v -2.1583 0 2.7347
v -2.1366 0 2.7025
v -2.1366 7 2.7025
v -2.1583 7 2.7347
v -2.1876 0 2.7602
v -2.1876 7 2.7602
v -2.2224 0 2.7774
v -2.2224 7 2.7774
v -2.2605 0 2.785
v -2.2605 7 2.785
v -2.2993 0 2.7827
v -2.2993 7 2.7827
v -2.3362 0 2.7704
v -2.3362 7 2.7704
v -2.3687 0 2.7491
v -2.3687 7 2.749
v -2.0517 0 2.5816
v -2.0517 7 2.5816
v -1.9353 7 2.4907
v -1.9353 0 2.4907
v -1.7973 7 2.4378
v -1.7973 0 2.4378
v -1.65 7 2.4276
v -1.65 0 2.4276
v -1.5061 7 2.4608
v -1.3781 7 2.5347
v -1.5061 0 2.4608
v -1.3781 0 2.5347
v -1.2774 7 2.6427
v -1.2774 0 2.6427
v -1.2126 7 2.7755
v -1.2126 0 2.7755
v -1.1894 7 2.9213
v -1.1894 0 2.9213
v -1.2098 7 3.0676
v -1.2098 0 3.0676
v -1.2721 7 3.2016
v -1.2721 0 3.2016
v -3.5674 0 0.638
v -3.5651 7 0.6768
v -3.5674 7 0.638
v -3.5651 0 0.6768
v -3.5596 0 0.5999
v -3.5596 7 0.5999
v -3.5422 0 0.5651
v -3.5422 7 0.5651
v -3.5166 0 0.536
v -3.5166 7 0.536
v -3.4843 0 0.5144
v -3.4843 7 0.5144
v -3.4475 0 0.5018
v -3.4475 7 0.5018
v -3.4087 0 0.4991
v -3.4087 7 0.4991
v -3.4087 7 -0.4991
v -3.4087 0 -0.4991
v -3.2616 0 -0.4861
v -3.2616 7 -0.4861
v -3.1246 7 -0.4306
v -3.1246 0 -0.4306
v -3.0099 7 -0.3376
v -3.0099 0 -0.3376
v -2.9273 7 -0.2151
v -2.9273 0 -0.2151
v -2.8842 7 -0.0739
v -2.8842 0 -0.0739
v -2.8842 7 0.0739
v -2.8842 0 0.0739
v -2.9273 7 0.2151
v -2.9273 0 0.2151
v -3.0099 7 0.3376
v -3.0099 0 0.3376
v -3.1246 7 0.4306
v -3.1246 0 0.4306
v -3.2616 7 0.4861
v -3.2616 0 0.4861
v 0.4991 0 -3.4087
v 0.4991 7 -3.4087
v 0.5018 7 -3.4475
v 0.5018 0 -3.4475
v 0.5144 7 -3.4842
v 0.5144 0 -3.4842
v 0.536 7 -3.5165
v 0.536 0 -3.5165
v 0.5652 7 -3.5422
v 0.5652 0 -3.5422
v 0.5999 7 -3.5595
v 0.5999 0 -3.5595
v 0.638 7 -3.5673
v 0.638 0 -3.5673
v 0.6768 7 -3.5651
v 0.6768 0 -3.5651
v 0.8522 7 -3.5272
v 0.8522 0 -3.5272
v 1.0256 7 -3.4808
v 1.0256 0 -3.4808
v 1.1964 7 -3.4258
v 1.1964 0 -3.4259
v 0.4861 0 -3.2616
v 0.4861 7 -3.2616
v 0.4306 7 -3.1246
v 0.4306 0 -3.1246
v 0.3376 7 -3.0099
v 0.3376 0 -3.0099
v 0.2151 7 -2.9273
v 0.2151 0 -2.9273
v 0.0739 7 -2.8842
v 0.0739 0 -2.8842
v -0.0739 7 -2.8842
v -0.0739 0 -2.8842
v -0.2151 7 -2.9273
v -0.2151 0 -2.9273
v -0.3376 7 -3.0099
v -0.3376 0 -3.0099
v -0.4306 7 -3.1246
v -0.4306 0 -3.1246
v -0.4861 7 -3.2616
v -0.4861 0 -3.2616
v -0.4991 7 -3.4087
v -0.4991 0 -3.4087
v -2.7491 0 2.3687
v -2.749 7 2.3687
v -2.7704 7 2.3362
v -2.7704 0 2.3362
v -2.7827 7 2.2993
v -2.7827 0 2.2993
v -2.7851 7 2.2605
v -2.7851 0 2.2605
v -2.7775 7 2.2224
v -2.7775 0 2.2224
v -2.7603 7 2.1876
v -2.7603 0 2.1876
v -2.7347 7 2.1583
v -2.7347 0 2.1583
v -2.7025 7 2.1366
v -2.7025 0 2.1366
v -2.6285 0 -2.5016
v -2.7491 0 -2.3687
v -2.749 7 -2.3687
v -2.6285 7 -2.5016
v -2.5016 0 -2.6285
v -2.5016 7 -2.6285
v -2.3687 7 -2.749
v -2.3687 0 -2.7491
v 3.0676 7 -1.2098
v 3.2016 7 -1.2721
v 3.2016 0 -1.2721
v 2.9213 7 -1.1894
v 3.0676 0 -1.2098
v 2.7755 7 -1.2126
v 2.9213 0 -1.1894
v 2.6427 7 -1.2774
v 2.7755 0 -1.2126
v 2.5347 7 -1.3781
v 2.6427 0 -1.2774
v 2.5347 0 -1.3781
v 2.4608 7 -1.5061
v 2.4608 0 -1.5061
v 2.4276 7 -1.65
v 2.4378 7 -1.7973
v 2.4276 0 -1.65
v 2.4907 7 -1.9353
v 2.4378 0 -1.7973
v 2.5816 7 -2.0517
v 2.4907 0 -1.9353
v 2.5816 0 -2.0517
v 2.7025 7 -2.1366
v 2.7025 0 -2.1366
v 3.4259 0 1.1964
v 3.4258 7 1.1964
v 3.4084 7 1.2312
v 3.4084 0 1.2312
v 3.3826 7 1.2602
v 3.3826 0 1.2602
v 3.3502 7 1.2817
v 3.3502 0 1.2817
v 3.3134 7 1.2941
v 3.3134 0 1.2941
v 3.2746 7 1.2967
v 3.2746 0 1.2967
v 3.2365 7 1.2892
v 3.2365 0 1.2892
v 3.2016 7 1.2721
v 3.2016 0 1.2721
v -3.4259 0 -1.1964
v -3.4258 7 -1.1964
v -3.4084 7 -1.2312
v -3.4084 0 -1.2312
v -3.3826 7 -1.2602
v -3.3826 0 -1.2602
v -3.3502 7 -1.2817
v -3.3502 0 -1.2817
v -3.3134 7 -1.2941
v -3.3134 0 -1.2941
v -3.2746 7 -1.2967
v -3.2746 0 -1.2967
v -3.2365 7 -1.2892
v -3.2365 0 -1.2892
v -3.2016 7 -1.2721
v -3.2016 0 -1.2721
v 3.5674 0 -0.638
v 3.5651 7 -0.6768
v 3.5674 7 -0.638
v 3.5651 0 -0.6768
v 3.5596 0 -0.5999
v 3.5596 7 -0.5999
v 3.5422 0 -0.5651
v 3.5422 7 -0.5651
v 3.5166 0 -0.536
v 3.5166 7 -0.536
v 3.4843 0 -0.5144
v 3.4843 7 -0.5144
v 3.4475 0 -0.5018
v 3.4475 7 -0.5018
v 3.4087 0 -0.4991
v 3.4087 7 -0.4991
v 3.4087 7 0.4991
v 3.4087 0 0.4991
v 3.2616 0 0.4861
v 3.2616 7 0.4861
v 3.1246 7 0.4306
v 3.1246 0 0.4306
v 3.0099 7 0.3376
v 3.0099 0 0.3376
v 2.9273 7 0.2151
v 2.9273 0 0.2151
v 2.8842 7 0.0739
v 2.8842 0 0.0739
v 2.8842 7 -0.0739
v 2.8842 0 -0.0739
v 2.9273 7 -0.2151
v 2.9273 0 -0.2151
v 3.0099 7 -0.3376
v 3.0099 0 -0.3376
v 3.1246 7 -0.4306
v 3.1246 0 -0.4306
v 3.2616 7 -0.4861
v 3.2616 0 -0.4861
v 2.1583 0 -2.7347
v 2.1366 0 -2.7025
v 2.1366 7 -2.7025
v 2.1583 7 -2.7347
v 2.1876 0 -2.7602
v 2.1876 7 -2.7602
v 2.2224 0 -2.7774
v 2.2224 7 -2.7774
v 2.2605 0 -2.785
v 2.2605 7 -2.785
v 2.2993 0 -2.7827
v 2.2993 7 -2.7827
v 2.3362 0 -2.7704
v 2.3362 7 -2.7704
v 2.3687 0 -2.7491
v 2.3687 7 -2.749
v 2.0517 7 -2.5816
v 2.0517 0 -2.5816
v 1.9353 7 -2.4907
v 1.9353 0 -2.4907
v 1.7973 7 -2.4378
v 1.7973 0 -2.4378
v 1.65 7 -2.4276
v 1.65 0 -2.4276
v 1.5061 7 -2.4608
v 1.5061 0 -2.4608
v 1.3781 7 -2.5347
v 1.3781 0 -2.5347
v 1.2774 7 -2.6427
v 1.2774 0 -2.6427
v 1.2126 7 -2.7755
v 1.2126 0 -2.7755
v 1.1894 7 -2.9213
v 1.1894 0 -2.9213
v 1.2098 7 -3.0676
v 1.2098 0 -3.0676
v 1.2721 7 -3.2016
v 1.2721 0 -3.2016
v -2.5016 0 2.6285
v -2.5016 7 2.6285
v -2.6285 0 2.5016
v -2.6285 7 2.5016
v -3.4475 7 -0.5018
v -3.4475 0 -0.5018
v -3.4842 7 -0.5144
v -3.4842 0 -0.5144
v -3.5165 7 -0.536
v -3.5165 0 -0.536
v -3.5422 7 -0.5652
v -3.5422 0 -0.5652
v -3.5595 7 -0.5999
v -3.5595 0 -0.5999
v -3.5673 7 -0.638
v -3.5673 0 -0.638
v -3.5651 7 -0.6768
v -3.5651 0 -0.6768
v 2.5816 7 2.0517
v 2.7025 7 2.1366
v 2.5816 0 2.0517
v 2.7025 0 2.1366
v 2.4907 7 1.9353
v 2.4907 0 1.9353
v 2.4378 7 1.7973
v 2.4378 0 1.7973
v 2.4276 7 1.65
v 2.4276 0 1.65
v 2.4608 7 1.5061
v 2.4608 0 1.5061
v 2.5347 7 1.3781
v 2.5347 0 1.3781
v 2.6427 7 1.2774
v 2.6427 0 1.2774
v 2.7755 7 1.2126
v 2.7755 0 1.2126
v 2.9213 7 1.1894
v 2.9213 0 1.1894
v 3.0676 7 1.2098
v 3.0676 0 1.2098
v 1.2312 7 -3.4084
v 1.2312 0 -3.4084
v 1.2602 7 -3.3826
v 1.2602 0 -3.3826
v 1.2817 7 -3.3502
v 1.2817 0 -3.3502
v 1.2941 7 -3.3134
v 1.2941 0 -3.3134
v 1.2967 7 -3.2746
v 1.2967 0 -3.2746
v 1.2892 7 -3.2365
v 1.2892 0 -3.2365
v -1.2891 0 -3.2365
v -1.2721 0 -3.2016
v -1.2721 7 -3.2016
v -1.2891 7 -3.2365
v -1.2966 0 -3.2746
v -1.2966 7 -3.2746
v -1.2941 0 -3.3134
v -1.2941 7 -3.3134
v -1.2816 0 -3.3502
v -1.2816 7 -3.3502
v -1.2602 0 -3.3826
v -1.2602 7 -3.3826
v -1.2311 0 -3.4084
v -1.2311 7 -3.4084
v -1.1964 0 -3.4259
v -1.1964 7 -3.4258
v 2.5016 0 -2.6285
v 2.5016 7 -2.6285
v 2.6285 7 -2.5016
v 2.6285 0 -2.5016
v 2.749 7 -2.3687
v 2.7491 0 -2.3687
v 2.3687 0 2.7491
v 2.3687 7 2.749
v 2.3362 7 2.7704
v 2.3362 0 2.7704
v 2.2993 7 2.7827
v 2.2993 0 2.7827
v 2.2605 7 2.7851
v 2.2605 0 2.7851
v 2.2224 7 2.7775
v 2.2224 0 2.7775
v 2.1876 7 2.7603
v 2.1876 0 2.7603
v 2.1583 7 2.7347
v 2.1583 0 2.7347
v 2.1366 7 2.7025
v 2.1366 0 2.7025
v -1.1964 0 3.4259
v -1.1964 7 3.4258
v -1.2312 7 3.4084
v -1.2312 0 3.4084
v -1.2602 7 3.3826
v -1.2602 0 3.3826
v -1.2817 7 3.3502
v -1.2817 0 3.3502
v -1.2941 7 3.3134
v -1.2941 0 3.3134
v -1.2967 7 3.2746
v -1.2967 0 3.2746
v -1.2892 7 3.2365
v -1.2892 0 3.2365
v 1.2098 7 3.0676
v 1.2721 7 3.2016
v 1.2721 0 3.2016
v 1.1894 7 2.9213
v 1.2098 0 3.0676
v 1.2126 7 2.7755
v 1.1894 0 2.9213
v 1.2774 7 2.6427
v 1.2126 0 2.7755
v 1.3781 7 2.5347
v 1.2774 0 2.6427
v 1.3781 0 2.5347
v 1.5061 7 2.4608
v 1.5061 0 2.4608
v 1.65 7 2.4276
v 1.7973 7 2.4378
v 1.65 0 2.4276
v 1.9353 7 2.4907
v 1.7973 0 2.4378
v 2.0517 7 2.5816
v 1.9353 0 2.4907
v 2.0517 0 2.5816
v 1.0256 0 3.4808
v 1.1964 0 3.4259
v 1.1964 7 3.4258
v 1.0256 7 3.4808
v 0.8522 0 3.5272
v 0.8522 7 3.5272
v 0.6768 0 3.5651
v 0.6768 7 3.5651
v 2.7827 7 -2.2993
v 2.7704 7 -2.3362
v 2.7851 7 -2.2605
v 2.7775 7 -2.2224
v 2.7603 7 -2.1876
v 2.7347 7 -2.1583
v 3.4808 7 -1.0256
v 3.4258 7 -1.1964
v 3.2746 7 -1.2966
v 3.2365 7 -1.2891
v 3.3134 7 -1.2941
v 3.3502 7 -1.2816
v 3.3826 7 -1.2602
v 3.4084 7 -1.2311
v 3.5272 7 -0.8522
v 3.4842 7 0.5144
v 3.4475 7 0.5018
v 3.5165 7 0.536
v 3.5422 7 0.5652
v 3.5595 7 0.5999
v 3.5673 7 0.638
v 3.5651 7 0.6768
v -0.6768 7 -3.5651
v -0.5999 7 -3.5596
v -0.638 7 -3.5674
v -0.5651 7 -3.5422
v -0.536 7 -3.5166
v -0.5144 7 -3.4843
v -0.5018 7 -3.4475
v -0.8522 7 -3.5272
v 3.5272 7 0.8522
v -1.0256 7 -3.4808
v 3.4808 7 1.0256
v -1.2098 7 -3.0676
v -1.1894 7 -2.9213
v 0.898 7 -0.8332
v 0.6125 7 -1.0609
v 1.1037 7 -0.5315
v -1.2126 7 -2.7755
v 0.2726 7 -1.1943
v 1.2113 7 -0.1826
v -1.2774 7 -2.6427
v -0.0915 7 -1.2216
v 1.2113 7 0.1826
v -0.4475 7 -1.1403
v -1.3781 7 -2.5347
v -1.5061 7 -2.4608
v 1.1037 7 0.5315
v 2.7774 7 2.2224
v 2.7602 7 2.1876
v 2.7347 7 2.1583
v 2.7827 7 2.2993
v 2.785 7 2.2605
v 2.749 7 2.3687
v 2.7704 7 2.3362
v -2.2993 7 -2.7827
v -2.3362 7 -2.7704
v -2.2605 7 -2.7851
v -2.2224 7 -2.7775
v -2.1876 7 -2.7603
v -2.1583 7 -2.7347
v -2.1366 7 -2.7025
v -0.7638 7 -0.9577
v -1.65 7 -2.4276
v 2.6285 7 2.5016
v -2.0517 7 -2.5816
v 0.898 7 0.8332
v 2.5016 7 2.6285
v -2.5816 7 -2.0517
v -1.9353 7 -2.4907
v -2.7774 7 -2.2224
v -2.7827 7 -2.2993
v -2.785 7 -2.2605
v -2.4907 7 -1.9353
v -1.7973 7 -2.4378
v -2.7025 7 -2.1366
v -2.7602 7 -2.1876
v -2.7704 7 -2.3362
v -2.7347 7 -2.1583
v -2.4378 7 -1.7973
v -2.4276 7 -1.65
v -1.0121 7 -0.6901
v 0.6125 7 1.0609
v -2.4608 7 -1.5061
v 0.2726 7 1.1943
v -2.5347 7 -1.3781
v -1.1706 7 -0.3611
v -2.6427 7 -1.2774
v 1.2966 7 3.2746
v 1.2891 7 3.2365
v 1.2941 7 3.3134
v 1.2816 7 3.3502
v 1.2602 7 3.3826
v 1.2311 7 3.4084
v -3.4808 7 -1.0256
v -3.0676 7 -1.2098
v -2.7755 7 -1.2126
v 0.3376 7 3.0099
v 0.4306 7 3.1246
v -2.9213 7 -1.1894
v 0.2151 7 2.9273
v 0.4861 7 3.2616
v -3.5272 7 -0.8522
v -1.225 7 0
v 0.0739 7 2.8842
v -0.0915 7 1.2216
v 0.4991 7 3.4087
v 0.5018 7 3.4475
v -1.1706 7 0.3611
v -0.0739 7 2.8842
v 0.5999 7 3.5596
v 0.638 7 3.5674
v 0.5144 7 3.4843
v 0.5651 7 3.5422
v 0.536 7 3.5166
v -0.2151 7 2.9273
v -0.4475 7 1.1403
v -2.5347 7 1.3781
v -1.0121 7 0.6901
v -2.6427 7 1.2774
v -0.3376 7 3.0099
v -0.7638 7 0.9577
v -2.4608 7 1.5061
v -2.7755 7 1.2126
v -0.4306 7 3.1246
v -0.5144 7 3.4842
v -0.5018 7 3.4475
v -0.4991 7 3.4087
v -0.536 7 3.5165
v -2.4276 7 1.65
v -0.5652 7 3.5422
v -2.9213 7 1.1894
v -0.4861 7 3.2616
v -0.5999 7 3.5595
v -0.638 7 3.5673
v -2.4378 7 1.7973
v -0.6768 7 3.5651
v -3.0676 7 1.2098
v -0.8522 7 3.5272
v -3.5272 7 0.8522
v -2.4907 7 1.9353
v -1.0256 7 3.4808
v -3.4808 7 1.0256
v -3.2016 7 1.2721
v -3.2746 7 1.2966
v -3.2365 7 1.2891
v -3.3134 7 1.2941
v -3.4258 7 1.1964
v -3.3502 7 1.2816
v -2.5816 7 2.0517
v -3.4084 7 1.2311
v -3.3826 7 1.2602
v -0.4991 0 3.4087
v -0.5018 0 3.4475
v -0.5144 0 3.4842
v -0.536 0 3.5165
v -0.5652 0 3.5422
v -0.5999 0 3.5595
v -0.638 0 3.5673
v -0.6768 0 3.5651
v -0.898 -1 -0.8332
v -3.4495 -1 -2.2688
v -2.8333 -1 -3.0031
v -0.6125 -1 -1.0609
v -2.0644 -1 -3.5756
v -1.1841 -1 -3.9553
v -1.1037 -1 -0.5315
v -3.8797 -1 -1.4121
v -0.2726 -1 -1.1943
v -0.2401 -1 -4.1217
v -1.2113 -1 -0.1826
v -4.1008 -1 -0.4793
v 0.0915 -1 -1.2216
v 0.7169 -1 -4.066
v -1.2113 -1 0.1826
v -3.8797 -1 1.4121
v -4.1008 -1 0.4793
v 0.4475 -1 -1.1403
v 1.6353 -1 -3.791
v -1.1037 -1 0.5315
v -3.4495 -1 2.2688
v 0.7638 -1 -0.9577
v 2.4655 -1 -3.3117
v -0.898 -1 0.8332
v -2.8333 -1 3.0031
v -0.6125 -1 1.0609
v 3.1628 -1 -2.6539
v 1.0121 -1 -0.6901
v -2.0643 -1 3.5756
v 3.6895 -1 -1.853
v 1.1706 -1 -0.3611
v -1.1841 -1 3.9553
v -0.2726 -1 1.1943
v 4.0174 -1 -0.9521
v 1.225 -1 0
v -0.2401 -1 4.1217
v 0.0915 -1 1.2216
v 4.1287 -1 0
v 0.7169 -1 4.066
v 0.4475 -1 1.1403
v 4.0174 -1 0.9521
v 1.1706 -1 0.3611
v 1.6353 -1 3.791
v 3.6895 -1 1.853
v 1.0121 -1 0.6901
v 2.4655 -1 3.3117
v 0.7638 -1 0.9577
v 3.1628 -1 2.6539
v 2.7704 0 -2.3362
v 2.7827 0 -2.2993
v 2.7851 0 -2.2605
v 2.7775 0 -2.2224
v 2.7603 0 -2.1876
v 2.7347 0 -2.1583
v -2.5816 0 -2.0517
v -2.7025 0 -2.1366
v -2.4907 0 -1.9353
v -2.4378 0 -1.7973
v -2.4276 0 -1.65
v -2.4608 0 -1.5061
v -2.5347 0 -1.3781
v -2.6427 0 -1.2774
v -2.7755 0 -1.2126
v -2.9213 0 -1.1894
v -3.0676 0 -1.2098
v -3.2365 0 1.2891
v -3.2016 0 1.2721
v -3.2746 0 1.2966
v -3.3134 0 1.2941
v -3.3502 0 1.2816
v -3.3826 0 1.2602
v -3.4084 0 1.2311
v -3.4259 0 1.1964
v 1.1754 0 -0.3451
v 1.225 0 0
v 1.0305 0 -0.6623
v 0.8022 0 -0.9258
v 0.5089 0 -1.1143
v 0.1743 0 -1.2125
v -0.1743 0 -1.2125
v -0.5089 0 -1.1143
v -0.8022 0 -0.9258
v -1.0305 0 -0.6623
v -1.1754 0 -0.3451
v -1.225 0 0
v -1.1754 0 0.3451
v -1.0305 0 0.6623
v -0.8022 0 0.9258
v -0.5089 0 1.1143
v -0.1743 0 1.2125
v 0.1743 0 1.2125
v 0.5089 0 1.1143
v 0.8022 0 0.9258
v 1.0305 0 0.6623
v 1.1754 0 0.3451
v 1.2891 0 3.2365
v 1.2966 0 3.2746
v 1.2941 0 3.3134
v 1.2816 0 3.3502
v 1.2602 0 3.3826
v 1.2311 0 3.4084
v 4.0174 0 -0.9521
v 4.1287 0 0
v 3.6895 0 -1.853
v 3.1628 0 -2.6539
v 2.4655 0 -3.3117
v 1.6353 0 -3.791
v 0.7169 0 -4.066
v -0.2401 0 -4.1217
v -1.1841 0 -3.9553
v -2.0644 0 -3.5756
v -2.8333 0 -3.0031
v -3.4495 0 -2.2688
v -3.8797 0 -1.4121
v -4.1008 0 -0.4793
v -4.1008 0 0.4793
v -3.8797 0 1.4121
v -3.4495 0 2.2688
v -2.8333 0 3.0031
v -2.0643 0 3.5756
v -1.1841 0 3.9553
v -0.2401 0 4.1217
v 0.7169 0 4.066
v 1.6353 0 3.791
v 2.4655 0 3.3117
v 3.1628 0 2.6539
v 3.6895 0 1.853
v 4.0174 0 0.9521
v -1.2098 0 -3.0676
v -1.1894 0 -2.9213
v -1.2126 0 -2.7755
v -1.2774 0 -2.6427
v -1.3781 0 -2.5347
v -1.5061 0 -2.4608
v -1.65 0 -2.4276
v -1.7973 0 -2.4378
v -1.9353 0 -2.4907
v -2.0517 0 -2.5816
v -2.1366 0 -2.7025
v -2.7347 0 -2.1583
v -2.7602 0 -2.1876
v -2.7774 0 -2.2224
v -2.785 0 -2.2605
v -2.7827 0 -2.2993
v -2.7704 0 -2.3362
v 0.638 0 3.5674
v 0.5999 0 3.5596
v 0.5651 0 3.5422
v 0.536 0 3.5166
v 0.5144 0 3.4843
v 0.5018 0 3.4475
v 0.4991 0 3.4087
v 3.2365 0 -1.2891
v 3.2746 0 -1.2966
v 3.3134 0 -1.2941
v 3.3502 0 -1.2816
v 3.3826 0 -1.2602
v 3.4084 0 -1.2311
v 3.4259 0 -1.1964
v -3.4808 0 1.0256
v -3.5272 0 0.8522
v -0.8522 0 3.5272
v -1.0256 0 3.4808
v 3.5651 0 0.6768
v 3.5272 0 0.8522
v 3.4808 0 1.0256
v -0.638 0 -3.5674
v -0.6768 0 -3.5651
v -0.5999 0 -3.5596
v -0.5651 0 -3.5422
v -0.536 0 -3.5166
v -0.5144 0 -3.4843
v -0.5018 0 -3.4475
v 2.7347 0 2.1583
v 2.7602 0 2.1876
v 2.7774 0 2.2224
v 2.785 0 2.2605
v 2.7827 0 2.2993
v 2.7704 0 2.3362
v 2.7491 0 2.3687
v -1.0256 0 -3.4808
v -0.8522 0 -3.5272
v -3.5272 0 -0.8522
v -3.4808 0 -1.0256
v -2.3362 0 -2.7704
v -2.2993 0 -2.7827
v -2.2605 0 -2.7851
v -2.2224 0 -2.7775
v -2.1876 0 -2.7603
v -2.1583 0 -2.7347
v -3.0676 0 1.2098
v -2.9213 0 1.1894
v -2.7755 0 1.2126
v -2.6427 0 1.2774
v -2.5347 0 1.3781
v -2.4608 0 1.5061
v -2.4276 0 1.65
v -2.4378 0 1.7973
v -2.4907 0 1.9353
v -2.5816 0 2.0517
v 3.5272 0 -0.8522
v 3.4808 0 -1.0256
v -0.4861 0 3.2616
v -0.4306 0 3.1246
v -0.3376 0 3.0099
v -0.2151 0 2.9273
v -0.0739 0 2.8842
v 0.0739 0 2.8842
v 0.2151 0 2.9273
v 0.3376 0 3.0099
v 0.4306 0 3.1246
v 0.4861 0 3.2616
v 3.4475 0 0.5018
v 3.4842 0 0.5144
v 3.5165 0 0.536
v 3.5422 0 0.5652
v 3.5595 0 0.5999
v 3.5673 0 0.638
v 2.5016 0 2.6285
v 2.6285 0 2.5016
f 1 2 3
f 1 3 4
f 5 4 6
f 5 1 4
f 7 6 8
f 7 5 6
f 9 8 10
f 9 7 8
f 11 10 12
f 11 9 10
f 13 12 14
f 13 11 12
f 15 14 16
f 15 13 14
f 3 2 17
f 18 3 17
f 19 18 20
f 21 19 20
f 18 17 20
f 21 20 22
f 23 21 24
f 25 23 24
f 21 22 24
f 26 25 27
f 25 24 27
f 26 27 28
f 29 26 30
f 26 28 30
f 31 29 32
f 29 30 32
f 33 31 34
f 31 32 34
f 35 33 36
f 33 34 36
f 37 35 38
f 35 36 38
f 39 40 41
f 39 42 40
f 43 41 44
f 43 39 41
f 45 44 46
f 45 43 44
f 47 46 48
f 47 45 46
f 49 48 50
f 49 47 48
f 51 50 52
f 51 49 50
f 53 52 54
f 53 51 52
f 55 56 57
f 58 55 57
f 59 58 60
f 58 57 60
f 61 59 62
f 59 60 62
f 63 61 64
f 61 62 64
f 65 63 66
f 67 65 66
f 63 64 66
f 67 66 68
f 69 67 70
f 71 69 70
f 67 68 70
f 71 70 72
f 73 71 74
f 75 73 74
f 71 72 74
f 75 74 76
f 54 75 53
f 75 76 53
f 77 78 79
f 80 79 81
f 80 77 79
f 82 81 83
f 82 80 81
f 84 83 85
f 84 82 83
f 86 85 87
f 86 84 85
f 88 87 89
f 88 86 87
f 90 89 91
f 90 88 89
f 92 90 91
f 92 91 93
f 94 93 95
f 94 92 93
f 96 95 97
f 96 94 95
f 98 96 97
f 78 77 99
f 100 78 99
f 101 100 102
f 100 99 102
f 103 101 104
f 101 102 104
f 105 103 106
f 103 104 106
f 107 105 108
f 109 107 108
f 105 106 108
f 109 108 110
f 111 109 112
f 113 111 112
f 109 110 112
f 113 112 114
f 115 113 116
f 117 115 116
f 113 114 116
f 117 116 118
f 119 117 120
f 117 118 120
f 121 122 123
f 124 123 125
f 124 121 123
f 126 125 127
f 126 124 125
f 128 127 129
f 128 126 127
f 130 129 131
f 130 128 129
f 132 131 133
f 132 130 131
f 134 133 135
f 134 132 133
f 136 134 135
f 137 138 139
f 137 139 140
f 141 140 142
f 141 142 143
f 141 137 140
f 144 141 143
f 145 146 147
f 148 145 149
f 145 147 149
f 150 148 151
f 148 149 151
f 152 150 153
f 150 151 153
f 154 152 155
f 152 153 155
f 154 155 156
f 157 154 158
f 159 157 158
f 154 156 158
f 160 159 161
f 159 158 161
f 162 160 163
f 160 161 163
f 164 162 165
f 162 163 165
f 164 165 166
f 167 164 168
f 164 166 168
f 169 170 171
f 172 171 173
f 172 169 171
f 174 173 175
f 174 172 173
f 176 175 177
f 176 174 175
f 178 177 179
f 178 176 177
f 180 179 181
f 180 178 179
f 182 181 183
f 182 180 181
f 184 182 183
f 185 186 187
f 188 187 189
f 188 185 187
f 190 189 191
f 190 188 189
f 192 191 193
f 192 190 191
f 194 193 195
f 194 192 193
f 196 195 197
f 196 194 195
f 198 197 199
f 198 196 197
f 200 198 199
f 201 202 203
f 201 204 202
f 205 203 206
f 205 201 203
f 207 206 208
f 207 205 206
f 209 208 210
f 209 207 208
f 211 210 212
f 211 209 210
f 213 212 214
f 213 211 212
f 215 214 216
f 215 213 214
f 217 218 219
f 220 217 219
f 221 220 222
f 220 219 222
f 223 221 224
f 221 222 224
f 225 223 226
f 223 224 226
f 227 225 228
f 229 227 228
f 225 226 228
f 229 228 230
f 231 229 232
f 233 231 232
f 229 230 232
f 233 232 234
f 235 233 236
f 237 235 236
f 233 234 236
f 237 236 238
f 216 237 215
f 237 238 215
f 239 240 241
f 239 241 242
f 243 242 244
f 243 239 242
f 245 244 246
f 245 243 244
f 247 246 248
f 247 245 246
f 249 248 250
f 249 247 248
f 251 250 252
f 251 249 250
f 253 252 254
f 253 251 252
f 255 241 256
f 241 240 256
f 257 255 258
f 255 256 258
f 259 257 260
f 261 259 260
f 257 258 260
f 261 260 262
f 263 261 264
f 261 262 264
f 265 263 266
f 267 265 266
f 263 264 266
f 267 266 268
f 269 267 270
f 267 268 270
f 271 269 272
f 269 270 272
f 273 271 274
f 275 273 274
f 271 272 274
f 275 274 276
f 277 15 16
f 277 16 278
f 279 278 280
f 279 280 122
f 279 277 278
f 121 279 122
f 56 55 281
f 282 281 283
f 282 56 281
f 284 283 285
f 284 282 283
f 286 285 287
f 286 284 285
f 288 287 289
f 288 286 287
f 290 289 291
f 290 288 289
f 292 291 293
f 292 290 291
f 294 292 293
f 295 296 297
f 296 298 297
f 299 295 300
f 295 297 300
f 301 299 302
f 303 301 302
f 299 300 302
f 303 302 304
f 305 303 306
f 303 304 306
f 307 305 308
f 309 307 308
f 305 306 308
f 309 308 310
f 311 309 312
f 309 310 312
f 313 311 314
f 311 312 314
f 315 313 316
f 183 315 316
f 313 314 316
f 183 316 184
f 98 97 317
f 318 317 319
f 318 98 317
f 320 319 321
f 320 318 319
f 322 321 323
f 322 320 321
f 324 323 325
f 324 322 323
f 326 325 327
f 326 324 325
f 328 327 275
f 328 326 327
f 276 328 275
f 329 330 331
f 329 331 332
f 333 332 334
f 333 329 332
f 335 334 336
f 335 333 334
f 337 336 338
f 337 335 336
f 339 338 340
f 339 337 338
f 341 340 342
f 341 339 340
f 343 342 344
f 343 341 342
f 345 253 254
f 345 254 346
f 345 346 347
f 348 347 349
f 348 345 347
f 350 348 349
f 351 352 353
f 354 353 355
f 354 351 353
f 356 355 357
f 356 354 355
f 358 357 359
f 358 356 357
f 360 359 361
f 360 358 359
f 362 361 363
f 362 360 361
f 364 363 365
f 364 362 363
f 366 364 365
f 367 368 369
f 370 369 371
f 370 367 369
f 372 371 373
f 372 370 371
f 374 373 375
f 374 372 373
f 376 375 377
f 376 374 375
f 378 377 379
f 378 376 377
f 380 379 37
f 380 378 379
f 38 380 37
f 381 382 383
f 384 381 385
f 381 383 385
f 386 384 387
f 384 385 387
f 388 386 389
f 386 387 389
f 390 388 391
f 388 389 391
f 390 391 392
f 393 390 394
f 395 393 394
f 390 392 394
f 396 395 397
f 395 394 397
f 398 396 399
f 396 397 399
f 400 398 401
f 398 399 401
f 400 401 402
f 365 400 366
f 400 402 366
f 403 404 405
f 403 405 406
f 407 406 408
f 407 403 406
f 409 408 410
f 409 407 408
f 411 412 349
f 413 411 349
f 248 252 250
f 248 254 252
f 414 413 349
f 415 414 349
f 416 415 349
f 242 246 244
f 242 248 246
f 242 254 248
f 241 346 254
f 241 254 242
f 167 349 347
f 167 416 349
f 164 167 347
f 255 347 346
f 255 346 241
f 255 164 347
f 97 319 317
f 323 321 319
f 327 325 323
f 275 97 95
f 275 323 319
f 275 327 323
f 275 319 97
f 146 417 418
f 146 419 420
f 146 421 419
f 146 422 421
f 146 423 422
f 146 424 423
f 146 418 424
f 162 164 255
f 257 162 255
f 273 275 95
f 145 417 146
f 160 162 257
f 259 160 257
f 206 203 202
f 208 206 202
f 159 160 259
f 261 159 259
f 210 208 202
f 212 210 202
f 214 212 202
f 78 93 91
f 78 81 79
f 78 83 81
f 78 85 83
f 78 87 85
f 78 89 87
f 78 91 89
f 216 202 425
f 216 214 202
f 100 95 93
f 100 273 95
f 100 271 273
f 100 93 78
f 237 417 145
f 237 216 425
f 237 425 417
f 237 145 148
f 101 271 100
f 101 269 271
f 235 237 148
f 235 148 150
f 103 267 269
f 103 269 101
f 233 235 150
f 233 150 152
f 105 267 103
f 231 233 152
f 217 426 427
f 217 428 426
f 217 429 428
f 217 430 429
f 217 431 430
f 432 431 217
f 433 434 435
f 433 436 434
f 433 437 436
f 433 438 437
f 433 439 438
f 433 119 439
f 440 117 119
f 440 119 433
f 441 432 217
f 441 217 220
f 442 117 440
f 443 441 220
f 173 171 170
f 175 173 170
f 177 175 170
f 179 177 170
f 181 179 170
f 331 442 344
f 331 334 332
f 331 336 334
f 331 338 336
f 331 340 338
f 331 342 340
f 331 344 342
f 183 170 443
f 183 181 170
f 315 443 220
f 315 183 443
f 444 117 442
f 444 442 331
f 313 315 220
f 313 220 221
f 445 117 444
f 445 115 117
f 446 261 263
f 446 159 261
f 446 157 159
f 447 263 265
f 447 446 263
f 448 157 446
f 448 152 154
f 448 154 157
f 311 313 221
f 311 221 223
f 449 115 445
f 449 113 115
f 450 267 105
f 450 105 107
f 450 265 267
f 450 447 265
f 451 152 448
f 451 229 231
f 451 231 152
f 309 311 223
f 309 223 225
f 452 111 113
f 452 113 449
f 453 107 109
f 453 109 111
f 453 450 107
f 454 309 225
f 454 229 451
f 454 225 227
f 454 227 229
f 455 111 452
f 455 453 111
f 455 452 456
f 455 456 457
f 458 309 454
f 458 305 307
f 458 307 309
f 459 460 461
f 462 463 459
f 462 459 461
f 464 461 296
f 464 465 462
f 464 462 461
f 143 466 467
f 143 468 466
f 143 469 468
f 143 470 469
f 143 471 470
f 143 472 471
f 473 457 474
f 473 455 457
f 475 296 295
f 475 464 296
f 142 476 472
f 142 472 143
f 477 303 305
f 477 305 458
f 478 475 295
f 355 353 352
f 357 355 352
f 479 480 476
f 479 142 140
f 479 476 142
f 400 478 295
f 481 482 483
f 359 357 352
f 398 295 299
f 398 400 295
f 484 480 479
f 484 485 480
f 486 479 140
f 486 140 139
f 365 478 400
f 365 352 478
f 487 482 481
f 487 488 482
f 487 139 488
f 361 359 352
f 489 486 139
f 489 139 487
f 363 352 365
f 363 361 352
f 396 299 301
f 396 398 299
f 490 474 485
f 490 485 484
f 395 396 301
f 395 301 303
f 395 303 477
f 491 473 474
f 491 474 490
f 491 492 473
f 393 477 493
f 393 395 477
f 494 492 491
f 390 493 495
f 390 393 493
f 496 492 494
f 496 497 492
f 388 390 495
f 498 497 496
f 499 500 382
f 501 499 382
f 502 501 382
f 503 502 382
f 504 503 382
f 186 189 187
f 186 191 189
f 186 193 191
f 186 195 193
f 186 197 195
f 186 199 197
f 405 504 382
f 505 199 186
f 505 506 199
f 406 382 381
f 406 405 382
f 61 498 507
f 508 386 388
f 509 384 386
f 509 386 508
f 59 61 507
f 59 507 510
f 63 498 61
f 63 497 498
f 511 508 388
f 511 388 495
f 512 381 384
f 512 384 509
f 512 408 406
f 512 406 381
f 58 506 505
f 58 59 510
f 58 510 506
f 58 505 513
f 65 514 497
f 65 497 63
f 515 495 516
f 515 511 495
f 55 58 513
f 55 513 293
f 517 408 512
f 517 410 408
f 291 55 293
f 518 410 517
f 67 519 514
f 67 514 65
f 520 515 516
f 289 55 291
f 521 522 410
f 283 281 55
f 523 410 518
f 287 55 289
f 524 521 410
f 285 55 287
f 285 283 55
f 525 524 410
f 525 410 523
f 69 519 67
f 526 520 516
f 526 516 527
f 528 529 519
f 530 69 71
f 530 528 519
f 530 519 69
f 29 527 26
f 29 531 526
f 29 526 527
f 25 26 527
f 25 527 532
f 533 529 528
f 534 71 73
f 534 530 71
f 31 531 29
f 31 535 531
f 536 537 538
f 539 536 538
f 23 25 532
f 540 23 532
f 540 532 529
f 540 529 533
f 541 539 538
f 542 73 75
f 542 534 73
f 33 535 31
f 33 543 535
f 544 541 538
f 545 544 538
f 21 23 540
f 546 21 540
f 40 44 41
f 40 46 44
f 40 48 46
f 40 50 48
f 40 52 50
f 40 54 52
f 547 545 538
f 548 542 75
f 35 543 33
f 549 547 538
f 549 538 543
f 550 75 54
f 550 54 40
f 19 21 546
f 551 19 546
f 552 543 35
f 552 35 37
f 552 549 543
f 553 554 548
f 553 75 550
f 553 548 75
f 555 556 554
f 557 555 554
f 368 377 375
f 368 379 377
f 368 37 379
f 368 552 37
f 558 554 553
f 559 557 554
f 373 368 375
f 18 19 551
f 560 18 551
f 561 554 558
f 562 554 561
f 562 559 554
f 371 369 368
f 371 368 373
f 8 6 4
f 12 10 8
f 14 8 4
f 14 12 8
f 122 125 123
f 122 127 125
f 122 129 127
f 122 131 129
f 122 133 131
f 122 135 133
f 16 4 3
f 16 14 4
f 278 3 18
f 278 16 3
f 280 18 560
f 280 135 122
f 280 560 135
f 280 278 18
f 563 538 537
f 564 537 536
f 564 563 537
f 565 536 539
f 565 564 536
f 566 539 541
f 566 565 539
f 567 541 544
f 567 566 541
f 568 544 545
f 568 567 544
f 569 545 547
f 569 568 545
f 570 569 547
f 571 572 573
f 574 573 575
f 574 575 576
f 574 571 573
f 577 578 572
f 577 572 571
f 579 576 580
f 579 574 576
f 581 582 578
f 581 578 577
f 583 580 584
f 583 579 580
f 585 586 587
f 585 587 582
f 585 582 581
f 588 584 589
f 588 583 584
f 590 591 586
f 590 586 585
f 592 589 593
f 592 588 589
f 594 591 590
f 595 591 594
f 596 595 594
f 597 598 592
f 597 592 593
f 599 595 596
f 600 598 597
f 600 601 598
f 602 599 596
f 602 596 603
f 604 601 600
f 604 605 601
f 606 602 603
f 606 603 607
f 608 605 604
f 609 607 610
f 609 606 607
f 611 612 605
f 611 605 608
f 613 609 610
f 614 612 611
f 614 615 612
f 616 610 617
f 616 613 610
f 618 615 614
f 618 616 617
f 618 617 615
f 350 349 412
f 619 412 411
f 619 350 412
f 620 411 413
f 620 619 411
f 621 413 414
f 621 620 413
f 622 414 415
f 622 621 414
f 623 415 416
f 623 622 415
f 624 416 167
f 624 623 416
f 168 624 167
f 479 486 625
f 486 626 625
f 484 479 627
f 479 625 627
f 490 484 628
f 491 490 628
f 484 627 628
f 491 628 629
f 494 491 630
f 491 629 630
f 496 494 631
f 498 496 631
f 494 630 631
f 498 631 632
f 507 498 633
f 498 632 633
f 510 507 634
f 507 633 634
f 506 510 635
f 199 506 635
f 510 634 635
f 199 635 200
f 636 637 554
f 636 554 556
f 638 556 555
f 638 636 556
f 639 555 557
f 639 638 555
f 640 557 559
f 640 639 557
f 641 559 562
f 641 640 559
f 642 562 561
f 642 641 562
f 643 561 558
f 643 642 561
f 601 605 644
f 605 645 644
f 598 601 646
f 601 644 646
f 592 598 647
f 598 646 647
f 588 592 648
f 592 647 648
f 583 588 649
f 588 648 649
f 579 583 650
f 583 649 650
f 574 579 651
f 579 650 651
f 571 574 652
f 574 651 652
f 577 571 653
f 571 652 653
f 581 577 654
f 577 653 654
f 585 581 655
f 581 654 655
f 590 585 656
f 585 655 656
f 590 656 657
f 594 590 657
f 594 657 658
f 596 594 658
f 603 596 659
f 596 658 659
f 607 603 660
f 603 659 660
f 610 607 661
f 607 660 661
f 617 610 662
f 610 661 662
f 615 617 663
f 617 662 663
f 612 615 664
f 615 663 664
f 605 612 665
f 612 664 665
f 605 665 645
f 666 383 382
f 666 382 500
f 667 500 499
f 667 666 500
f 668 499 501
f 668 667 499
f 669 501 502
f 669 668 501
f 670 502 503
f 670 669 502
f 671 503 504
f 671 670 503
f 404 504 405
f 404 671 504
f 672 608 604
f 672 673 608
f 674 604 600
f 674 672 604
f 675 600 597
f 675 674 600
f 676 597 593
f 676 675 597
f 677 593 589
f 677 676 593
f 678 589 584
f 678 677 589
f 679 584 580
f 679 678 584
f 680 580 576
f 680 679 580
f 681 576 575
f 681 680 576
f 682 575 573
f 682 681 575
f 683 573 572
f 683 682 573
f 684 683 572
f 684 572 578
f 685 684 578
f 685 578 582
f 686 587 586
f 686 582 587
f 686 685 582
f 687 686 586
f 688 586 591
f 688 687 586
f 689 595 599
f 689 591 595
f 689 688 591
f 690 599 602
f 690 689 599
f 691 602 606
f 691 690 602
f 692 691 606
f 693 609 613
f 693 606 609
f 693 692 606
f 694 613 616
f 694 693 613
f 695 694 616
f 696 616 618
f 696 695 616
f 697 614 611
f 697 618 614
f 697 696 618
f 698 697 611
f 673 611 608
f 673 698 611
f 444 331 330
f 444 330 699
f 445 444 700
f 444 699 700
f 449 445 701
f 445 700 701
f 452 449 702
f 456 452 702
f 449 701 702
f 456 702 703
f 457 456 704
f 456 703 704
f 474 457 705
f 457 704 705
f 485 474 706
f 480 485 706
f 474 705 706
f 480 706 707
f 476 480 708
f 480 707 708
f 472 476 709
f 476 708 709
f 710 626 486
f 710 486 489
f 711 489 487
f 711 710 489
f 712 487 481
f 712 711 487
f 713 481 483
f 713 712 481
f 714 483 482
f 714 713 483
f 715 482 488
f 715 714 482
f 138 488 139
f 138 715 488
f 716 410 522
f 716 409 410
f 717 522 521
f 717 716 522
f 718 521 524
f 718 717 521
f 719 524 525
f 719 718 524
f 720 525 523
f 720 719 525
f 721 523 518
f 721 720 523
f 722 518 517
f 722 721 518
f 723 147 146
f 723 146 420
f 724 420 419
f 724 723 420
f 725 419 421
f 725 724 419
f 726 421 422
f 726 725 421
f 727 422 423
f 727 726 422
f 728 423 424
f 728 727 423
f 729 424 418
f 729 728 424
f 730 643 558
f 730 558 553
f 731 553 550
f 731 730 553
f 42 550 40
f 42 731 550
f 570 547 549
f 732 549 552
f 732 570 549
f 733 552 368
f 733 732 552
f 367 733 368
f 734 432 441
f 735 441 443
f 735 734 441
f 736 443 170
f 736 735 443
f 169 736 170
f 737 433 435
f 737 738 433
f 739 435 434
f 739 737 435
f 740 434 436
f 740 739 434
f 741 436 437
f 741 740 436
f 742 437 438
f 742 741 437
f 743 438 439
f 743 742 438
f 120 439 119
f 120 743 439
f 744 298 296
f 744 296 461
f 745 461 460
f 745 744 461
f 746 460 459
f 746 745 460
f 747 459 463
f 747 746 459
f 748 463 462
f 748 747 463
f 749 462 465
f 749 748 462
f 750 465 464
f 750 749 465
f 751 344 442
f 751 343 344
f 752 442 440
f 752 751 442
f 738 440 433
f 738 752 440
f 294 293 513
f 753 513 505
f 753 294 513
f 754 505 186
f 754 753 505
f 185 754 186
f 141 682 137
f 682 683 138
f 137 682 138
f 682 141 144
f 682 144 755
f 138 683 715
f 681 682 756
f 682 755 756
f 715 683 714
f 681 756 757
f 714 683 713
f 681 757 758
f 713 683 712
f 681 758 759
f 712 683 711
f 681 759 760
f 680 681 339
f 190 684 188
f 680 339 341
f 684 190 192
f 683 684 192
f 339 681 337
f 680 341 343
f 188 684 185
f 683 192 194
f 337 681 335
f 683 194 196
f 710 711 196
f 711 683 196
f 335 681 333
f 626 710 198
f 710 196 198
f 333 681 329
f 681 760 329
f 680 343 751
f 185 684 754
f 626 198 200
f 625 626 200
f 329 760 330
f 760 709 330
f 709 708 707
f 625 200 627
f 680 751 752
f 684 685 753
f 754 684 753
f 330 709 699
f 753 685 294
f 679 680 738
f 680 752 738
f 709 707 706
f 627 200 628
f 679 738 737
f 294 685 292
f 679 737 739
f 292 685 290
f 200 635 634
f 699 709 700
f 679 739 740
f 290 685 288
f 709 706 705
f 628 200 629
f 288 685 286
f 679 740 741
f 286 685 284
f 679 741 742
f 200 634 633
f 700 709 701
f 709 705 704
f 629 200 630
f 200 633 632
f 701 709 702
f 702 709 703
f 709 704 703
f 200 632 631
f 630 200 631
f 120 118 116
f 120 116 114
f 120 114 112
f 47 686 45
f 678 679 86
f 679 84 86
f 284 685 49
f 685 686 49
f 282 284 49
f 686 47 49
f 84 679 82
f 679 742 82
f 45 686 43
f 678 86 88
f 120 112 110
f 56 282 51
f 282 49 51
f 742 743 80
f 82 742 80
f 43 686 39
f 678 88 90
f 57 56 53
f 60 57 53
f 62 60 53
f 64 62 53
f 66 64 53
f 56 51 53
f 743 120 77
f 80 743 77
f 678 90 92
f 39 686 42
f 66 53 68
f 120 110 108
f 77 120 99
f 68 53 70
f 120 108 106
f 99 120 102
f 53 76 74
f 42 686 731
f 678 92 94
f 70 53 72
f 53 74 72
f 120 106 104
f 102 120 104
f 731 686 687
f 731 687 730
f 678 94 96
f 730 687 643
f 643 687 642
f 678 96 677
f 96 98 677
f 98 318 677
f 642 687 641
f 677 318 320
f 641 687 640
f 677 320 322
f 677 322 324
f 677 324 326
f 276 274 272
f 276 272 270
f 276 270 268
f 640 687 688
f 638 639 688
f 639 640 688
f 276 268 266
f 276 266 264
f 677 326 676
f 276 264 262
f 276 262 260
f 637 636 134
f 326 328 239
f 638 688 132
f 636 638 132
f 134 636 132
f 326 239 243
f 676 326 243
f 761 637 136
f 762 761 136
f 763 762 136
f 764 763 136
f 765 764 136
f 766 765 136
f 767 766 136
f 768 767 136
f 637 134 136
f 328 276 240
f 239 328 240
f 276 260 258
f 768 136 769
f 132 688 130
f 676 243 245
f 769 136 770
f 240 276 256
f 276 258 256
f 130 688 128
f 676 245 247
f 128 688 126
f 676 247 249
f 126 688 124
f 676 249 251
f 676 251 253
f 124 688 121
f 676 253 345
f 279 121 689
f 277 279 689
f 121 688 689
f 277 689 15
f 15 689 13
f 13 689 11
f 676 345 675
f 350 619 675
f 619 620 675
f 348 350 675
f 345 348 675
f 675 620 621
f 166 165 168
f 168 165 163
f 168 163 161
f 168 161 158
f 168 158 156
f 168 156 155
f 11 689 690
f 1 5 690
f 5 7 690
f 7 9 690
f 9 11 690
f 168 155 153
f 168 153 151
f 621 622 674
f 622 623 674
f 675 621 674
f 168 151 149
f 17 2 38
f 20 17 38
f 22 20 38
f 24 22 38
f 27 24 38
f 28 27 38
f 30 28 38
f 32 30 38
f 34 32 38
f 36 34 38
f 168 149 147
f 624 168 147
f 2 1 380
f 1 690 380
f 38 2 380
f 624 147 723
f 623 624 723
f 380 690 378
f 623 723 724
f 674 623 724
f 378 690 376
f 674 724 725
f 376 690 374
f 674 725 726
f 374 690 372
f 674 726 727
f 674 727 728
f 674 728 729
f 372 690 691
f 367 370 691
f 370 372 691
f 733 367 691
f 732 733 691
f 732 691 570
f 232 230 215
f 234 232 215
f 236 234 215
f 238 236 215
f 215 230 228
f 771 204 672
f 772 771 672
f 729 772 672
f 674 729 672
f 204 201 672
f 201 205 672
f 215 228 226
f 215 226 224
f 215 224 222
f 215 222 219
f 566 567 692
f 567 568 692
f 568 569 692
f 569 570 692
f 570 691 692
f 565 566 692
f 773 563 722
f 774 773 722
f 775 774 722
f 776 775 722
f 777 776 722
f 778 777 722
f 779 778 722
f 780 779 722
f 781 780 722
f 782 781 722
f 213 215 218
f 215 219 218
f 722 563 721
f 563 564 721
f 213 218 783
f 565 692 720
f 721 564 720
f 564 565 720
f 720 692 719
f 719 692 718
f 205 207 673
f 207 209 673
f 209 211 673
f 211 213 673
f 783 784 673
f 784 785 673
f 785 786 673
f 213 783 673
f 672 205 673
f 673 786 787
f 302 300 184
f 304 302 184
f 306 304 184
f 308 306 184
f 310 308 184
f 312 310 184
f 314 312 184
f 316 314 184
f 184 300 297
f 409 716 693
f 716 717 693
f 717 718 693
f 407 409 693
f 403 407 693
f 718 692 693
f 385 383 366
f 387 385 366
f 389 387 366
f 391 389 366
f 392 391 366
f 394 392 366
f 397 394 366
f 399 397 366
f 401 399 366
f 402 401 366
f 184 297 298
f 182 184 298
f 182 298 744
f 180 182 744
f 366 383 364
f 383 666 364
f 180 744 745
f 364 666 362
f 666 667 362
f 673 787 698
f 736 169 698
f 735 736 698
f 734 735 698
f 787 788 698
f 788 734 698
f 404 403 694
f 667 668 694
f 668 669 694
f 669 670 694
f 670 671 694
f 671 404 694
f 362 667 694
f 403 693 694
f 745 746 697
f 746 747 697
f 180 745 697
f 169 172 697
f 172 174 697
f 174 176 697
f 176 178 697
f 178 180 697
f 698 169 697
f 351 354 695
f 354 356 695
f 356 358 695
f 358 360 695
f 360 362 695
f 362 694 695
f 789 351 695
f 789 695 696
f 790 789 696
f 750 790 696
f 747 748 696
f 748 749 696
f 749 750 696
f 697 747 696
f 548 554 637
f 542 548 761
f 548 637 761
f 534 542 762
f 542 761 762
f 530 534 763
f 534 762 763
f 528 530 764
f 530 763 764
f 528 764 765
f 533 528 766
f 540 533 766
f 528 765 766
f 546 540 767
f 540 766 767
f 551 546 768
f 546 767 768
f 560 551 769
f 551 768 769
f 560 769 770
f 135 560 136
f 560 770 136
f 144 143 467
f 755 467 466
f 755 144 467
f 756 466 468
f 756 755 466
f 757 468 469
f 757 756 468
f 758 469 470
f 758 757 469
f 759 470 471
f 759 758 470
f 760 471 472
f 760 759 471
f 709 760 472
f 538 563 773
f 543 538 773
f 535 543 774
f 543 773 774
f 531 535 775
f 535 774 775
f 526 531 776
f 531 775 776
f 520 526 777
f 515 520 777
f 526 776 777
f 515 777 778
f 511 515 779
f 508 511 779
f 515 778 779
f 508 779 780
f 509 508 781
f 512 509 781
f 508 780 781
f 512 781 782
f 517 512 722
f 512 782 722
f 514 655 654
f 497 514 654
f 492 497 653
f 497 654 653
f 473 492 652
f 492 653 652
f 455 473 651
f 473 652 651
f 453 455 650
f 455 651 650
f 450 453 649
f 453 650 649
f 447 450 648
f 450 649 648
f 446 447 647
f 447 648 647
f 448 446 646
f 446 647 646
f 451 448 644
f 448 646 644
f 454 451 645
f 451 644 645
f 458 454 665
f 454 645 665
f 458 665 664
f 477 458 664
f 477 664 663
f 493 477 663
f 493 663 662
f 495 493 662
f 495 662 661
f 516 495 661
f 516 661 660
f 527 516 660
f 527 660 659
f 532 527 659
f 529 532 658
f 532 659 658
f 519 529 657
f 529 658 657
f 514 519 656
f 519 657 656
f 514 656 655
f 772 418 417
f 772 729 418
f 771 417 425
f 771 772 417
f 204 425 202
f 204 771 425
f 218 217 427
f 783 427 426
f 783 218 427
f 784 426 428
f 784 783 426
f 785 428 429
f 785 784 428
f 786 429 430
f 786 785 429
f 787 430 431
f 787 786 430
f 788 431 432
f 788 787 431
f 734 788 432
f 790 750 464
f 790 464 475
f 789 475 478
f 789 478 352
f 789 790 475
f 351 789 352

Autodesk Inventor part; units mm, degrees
ref_plane "YZ Plane" through (0, 0, 0) normal (1, 0, 0) x (0, 1, 0)
ref_plane "XZ Plane" through (0, 0, 0) normal (0, 1, 0) x (-1, 0, 0)
ref_plane "XY Plane" through (0, 0, 0) normal (0, 0, 1) x (1, 0, 0)
sketch "Sketch1" plane through (0, 0, 0) normal (0, 1, 0) x (-1, 0, 0)
  circle A0 centre (0, 0) radius 1.225
  circle A1 centre (0, 0) radius 3.6287
  dimension "BoreD" = 2.45
  dimension "OuterD" = 7.2575
extrude "Extrusion1" add sketch "Sketch1" along normal blind 7
sketch "Sketch2" plane through (0, 0, 0) normal (0, -1, 0) x (1, 0, 0)
  circle A0 centre (0, 0) radius 3.6287 projected
  arc A1 (0.4991, -3.4087) -> (0.6768, -3.5651) centre (0.6488, -3.4177) ccw
  arc A2 (0.4991, -3.4087) -> (-0.4991, -3.4087) centre (0, -3.3787) ccw
  arc A3 (-0.6768, -3.5651) -> (-0.4991, -3.4087) centre (-0.6488, -3.4177) ccw
  point P0 (0, -3.6287)
  dimension "d9" = 0.5
  dimension "d10" = 0.15
  dimension "Depth" = 0.25
extrude "Extrusion2" cut sketch "Sketch2" against normal up to next contours A3 A2 A1 A0 picked at (0, -3.374)
pattern_circular "Circular Pattern1" count 12 over 360 about axis through (0, -10, 0) along (0, 1, 0) of "Extrusion2"
sketch "Sketch3" plane through (0, 0, 0) normal (0, -1, 0) x (1, 0, 0)
  circle A0 centre (0, 0) radius 4.1287
  circle A1 centre (0, 0) radius 1.225
  dimension "FaceD" = 8.2575
  dimension "d18" = 2.45
extrude "Extrusion3" add sketch "Sketch3" along normal blind 1
equation "\"OuterD\" = 0.604789 * Teeth"
equation "\"Depth\" = Pitch"
equation "\"d18\" = BoreD"
equation "\"BeltWidth\" = 6"
equation "\"Pitch\" = 0.25"
equation "\"Teeth\" = 12"
properties part number "GT2 Gear"
